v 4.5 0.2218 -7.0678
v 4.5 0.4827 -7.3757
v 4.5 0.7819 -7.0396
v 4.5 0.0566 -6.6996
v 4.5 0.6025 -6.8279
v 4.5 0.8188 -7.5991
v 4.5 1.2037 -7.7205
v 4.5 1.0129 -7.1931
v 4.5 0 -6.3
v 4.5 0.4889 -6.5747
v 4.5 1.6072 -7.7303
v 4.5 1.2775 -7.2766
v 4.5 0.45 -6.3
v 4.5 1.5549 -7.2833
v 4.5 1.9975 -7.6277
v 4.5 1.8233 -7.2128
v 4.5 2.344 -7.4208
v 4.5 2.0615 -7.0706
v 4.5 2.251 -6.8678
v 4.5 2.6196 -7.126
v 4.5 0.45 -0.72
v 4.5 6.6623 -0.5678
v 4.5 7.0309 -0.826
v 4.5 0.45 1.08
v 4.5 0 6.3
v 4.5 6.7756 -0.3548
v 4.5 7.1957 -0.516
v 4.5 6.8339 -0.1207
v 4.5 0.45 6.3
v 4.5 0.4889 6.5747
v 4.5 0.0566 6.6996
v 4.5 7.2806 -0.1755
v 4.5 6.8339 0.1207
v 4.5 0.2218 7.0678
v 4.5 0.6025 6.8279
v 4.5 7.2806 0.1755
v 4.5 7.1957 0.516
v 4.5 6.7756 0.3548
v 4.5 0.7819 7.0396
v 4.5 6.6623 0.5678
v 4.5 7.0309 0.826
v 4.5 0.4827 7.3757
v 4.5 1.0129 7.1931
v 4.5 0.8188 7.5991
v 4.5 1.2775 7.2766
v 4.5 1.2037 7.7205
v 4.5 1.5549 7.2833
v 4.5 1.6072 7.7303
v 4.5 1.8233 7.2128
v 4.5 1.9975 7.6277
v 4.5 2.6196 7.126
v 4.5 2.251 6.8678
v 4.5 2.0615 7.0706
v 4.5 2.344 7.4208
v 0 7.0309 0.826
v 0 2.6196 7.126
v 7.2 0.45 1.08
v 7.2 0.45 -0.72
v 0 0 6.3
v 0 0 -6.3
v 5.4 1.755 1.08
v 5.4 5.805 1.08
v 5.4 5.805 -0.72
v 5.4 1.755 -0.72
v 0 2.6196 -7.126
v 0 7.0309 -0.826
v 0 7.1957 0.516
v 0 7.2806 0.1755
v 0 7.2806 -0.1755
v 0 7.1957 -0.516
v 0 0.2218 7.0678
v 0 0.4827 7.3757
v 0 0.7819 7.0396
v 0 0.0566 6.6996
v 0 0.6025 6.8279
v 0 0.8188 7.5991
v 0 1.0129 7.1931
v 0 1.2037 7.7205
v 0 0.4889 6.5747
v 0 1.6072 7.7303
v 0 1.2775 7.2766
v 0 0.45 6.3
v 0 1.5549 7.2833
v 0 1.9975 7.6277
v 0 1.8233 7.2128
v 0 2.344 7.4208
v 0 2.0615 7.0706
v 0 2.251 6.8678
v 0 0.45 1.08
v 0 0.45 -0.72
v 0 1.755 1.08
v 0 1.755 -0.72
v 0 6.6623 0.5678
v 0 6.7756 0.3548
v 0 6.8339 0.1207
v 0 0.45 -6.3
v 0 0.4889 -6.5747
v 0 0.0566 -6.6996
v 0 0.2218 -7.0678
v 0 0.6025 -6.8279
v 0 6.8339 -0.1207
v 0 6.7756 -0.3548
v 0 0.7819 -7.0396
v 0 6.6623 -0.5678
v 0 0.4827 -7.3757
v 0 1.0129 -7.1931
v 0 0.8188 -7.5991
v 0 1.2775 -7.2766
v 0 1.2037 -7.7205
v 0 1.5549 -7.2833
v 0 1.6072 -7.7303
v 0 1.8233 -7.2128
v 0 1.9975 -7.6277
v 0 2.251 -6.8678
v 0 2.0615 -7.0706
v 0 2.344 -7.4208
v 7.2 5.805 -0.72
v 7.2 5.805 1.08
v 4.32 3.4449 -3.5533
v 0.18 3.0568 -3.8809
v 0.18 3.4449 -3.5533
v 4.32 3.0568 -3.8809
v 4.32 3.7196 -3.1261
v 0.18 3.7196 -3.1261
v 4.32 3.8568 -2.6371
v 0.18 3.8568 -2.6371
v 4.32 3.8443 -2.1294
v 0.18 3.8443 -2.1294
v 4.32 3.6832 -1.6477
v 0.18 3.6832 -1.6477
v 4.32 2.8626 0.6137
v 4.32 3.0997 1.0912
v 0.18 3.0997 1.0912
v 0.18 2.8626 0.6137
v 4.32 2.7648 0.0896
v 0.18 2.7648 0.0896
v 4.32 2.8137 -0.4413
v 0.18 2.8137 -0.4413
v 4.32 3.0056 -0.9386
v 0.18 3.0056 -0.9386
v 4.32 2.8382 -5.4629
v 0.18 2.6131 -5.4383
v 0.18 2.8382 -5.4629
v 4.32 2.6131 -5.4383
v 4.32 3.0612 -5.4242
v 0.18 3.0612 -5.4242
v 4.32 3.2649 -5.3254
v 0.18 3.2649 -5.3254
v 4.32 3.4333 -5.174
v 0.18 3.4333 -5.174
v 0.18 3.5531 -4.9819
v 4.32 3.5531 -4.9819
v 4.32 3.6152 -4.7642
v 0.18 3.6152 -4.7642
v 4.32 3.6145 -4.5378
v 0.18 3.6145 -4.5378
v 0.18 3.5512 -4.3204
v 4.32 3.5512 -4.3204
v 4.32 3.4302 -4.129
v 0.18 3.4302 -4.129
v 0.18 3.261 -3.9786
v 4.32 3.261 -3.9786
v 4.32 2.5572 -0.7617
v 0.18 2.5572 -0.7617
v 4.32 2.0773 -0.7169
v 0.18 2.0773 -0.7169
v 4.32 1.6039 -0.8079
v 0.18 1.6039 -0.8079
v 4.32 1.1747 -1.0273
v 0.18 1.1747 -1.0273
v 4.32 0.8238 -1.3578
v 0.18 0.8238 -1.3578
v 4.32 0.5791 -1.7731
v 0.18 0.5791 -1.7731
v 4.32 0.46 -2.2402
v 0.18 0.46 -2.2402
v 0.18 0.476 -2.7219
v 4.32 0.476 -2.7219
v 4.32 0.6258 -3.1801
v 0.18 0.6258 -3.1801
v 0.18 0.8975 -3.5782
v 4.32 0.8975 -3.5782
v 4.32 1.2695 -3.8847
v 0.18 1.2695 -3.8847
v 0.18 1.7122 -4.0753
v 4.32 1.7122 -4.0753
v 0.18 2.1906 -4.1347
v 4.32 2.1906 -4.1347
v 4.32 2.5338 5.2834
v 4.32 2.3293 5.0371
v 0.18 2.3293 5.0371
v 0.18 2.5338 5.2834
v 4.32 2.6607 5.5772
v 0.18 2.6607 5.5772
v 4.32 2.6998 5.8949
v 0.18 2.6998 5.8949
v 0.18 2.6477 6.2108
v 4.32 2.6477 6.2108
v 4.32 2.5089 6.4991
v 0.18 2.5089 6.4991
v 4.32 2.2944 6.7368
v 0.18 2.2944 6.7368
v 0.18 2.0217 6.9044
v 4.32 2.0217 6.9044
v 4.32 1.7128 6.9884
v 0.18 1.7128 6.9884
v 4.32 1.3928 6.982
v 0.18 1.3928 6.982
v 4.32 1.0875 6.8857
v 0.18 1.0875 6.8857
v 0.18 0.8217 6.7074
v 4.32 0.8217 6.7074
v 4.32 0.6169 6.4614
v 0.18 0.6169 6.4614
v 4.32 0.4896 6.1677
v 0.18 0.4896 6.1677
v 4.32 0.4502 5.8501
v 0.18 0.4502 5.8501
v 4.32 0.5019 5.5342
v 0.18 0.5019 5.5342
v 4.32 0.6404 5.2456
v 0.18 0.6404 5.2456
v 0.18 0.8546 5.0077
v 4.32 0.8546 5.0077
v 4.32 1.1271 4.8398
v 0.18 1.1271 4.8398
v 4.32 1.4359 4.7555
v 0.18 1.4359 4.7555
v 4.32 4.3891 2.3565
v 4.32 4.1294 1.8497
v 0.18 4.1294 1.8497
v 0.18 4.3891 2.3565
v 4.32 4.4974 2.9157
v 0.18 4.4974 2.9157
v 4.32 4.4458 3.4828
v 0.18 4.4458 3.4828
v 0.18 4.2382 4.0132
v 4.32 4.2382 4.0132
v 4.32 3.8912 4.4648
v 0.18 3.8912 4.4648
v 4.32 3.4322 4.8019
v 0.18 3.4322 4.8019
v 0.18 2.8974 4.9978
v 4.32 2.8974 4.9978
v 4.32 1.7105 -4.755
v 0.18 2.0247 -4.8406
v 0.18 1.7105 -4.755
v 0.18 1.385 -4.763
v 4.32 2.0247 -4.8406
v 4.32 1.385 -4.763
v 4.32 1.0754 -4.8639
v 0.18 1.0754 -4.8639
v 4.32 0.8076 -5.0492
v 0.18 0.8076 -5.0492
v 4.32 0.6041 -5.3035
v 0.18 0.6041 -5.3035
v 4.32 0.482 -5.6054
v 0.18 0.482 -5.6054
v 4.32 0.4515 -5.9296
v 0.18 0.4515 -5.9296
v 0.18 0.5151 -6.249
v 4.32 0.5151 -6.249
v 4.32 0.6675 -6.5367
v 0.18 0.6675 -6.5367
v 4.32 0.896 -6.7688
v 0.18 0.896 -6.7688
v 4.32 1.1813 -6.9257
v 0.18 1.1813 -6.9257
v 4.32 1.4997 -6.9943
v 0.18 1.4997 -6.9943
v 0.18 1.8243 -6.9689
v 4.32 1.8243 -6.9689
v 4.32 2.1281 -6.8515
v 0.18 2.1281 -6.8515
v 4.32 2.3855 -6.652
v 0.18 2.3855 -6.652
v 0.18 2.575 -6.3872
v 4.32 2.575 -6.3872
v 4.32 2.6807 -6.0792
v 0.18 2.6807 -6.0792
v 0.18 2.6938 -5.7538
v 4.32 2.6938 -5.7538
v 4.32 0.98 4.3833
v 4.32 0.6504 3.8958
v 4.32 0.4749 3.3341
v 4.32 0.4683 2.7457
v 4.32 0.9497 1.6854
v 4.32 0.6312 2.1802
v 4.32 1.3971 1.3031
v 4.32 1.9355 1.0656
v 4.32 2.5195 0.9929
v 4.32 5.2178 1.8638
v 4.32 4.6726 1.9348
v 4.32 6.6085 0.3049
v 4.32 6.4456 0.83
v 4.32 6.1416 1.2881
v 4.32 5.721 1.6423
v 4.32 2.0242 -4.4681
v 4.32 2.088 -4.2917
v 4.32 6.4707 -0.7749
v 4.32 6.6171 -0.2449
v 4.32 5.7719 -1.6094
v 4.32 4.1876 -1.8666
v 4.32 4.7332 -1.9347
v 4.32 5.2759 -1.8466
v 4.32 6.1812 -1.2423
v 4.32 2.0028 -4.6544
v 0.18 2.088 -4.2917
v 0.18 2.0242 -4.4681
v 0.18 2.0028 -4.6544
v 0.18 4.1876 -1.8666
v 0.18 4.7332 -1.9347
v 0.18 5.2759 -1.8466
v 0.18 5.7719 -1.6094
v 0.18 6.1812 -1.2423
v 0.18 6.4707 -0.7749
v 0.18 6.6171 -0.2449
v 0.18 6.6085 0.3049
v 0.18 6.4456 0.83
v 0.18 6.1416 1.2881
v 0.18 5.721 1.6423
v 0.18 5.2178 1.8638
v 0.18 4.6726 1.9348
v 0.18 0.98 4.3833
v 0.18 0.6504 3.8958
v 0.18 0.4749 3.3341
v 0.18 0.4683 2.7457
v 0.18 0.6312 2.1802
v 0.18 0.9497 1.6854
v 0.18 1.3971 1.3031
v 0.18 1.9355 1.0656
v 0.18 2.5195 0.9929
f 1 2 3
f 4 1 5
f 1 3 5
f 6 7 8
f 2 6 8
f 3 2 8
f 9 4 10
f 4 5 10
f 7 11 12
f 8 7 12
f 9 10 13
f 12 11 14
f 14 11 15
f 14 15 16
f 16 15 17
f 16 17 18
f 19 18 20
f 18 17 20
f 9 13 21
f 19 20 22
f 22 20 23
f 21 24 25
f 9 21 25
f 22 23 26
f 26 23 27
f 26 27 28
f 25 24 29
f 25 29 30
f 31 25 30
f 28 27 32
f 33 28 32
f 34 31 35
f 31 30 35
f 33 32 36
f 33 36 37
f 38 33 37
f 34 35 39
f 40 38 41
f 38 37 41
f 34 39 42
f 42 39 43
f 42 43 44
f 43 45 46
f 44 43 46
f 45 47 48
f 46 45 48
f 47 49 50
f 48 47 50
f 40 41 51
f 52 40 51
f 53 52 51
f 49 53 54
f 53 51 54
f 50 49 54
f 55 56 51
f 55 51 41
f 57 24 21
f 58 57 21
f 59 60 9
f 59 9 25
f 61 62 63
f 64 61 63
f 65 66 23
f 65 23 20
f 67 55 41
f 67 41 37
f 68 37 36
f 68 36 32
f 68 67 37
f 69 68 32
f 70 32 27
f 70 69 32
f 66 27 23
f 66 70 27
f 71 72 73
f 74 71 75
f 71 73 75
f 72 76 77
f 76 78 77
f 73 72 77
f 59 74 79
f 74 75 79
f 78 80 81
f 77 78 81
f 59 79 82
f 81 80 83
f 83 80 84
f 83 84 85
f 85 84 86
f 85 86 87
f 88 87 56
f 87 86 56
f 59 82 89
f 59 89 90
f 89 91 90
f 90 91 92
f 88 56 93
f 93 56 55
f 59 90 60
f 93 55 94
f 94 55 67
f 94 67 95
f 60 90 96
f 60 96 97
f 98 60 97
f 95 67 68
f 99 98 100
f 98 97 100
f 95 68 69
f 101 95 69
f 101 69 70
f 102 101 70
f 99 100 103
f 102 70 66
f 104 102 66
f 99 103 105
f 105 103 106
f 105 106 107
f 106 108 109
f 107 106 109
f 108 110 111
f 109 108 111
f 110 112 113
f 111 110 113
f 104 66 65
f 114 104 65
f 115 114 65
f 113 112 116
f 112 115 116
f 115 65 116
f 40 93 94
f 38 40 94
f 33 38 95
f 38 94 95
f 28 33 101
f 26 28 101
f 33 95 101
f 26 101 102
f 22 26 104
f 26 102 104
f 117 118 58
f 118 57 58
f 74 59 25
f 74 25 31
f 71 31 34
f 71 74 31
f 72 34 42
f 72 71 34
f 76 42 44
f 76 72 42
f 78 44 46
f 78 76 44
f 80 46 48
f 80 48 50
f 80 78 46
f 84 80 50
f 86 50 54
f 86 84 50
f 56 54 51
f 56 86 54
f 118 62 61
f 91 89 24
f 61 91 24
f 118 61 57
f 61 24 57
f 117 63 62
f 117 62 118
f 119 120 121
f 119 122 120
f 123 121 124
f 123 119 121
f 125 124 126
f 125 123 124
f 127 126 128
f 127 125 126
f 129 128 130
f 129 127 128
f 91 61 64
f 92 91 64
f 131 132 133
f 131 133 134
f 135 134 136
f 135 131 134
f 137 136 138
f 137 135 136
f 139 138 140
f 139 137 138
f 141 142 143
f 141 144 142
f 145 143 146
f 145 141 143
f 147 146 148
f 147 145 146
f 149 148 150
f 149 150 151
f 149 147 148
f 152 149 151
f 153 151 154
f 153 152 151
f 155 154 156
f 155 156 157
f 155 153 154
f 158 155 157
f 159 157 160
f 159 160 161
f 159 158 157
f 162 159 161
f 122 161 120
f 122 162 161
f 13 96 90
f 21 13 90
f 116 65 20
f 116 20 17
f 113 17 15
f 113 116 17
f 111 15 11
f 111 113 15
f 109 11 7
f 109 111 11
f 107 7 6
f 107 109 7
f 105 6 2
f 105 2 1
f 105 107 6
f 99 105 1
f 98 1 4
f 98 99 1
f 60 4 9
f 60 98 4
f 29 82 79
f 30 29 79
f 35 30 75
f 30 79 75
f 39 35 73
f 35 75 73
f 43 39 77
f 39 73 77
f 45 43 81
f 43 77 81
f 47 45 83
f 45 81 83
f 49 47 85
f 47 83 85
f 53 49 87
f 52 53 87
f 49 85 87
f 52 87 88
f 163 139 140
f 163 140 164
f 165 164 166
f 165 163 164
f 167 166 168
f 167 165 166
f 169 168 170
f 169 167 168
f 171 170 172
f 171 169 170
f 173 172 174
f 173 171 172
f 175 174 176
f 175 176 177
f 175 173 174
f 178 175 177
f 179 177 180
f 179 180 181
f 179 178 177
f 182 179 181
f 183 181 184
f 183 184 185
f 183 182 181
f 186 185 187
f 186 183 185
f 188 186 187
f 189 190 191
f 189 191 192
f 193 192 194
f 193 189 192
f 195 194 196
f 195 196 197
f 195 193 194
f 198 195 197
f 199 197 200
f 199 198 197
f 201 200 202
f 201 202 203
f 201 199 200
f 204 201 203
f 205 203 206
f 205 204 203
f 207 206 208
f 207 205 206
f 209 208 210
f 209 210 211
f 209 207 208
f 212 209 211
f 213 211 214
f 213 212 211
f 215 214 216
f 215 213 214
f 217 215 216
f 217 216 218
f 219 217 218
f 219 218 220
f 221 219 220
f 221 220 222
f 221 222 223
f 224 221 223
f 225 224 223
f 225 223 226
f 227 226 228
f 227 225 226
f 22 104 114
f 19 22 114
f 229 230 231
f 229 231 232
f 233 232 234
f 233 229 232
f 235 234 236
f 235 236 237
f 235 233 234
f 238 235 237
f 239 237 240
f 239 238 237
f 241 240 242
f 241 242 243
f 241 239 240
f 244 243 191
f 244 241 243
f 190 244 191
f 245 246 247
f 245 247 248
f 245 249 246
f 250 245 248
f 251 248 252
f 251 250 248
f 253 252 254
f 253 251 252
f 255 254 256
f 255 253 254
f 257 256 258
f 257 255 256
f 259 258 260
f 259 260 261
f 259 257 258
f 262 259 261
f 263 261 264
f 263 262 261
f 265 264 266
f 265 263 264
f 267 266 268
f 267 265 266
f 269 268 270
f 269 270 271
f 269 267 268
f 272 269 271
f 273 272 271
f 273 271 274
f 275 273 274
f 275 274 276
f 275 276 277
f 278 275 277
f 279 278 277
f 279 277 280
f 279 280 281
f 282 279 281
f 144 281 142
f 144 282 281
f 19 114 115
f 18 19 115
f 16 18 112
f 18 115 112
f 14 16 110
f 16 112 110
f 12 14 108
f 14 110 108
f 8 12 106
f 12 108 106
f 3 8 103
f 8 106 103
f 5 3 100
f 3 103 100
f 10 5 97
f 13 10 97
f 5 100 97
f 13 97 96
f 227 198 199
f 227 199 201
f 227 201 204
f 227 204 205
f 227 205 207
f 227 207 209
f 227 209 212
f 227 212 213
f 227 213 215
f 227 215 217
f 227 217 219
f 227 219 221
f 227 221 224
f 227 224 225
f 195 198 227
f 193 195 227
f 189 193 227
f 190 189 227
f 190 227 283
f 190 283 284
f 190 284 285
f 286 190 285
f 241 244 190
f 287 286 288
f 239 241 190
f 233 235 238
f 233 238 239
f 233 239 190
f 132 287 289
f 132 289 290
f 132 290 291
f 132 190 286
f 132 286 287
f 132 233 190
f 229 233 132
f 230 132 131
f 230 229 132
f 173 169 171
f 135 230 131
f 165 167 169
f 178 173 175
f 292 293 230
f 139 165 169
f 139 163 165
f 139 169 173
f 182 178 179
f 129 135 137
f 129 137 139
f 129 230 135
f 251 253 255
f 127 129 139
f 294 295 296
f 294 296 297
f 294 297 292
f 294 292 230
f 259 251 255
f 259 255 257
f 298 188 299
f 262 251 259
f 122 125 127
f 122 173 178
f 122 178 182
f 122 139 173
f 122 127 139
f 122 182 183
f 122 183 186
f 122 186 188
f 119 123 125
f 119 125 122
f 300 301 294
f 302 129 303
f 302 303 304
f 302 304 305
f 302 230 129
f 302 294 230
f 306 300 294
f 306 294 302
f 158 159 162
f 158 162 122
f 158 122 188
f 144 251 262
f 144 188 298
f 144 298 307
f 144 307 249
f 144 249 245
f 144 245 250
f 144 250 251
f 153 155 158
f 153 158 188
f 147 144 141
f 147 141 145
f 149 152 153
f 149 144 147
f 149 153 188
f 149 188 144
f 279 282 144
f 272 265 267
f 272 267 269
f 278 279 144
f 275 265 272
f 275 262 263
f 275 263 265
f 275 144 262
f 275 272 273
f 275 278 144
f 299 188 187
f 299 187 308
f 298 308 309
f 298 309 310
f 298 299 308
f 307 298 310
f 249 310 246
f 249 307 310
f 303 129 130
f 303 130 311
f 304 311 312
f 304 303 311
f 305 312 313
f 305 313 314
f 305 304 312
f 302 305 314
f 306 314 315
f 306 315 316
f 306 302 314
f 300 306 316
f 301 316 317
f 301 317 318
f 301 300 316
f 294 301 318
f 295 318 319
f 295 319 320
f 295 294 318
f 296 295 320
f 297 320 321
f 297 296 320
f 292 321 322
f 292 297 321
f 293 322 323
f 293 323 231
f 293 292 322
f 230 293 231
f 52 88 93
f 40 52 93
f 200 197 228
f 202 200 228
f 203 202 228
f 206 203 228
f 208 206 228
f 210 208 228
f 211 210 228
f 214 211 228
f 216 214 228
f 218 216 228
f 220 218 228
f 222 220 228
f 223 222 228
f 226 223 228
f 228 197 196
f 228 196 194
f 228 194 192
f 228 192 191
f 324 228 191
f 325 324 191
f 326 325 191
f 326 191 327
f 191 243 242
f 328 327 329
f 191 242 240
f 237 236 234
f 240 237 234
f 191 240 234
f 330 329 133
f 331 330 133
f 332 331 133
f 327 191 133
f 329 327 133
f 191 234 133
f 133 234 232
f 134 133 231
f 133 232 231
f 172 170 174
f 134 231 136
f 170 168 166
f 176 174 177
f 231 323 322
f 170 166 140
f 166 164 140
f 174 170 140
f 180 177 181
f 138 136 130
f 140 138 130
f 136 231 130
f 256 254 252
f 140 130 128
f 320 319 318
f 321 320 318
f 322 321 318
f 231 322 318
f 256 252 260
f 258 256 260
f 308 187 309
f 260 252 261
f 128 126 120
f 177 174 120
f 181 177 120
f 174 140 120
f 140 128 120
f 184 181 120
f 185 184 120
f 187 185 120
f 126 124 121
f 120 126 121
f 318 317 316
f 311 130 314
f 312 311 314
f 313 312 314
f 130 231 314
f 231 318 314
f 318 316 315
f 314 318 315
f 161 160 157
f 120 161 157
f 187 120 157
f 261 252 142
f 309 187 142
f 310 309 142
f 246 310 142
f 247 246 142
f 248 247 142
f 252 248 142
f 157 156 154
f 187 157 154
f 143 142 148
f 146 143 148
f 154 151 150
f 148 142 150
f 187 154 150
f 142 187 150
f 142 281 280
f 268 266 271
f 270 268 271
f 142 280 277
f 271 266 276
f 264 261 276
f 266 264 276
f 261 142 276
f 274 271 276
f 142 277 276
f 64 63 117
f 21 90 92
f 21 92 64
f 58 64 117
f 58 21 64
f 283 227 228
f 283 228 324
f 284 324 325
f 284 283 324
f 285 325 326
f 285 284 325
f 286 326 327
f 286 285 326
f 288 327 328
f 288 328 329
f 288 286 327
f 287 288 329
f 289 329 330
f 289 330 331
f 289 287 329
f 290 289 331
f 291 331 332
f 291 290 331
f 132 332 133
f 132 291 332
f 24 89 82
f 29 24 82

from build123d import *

# Parameters (mm, degrees)
TREADS_DEPTH                   = 2.5
CIRCLES_DEPTH                  = 1.15
CIRCLES_DEPTH_BACK             = 1.15
BOTTOM_OF_CONNECTOR_DEPTH      = 2.75
BOTTOM_OF_CONNECTOR_DEPTH_BACK = 1.25
SKETCH3_5_W                    = 1
SKETCH3_5_H                    = 0.725
SKETCH4_W                      = 1
SKETCH4_H                      = 1
TOP_OF_CONNECTOR_DEPTH         = 2.25
SCALE1_SCALE                   = 1.8


with BuildPart() as part:
    # Sketch1 → Treads (new body)
    with BuildSketch(Plane(origin=(0, 0, 0), x_dir=(0, 0, -1), z_dir=(1, 0, 0))):
        with BuildLine():
            Line((-3, 0), (3, 0))
            Line((3, 0), (3.5, 0))
            ThreePointArc((3.5, 0), (4.262973561, 0.55943536), (3.958861149, 1.455321635))
            Line((3.958861149, 1.455321635), (0.458861149, 3.906048019))
            ThreePointArc((0.458861149, 3.906048019), (0, 4.050726384), (-0.458861149, 3.906048019))
            Line((-0.458861149, 3.906048019), (-3.958861149, 1.455321635))
            ThreePointArc((-3.958861149, 1.455321635), (-4.262973561, 0.55943536), (-3.5, 0))
            Line((-3.5, 0), (-3, 0))
        make_face()
        with BuildLine():
            ThreePointArc((0, 3.800726384), (0.16538819, 3.775270707), (0.31546704, 3.701260008))
            Line((0.31546704, 3.701260008), (3.81546704, 1.250533624))
            ThreePointArc((3.81546704, 1.250533624), (4.024544323, 0.63461181), (3.5, 0.25))
            Line((3.5, 0.25), (-3.5, 0.25))
            ThreePointArc((-3.5, 0.25), (-4.024544323, 0.63461181), (-3.81546704, 1.250533624))
            Line((-3.81546704, 1.250533624), (-0.31546704, 3.701260008))
            ThreePointArc((-0.31546704, 3.701260008), (-0.16538819, 3.775270707), (0, 3.800726384))
        make_face(mode=Mode.SUBTRACT)
    extrude(amount=TREADS_DEPTH)

    # Sketch3<5> → Bottom of Connector (add, two sides: drawn at the far end of the back side and taken through both)
    with BuildSketch(Plane(origin=(1.25, 0, 0), x_dir=(0, 0, -1), z_dir=(1, 0, 0)).offset(-BOTTOM_OF_CONNECTOR_DEPTH_BACK)):
        with Locations((-0.1, 0.6125)):
            Rectangle(SKETCH3_5_W, SKETCH3_5_H)
    extrude(amount=BOTTOM_OF_CONNECTOR_DEPTH + BOTTOM_OF_CONNECTOR_DEPTH_BACK)

    # Sketch4 → Top of Connector (add)
    with BuildSketch(Plane(origin=(0, 0.975, 0), x_dir=(1, 0, 0), z_dir=(0, 1, 0))):
        with Locations((3.5, -0.1)):
            Rectangle(SKETCH4_W, SKETCH4_H)
    extrude(amount=TOP_OF_CONNECTOR_DEPTH)


with BuildPart() as body_2:
    # Sketch3 → Circles (new, two sides: drawn at the far end of the back side and taken through both)
    with BuildSketch(Plane(origin=(1.25, 0, 0), x_dir=(0, 0, -1), z_dir=(1, 0, 0)).offset(-CIRCLES_DEPTH_BACK)):
        with BuildLine():
            ThreePointArc((-2.641926718, 0.797718657), (-1.211224345, 0.350647058), (-0.606199298, 1.722043057))
            ThreePointArc((-0.606199298, 1.722043057), (-0.049783758, 1.535973098), (0.521460622, 1.669764503))
            ThreePointArc((0.521460622, 1.669764503), (1.112446431, 0.279457962), (2.297033365, 1.216992122))
            ThreePointArc((2.297033365, 1.216992122), (2.482253195, 1.124579804), (2.68924678, 1.124858699))
            ThreePointArc((2.68924678, 1.124858699), (3.700598319, 0.429611546), (3.021273042, 1.451725878))
            ThreePointArc((3.021273042, 1.451725878), (2.708453629, 1.995435529), (2.15606319, 1.698213434))
            ThreePointArc((2.15606319, 1.698213434), (1.60374964, 2.114699273), (0.915404217, 2.046206275))
            ThreePointArc((0.915404217, 2.046206275), (0.136054833, 3.676175239), (-1.027595727, 2.294110965))
            ThreePointArc((-1.027595727, 2.294110965), (-2.229550715, 2.354579066), (-2.798416042, 1.294039382))
            ThreePointArc((-2.798416042, 1.294039382), (-3.858203484, 0.687058875), (-2.641926718, 0.797718657))
        make_face()
    extrude(amount=CIRCLES_DEPTH + CIRCLES_DEPTH_BACK)


with BuildPart() as part_1:
    # Scale1: scaled about (0, 0, 0)
    add(part.part.scale(SCALE1_SCALE))


with BuildPart() as body_2_1:
    # Scale1: scaled about (0, 0, 0)
    add(body_2.part.scale(SCALE1_SCALE))


solid = Compound([part_1.part, body_2_1.part])
